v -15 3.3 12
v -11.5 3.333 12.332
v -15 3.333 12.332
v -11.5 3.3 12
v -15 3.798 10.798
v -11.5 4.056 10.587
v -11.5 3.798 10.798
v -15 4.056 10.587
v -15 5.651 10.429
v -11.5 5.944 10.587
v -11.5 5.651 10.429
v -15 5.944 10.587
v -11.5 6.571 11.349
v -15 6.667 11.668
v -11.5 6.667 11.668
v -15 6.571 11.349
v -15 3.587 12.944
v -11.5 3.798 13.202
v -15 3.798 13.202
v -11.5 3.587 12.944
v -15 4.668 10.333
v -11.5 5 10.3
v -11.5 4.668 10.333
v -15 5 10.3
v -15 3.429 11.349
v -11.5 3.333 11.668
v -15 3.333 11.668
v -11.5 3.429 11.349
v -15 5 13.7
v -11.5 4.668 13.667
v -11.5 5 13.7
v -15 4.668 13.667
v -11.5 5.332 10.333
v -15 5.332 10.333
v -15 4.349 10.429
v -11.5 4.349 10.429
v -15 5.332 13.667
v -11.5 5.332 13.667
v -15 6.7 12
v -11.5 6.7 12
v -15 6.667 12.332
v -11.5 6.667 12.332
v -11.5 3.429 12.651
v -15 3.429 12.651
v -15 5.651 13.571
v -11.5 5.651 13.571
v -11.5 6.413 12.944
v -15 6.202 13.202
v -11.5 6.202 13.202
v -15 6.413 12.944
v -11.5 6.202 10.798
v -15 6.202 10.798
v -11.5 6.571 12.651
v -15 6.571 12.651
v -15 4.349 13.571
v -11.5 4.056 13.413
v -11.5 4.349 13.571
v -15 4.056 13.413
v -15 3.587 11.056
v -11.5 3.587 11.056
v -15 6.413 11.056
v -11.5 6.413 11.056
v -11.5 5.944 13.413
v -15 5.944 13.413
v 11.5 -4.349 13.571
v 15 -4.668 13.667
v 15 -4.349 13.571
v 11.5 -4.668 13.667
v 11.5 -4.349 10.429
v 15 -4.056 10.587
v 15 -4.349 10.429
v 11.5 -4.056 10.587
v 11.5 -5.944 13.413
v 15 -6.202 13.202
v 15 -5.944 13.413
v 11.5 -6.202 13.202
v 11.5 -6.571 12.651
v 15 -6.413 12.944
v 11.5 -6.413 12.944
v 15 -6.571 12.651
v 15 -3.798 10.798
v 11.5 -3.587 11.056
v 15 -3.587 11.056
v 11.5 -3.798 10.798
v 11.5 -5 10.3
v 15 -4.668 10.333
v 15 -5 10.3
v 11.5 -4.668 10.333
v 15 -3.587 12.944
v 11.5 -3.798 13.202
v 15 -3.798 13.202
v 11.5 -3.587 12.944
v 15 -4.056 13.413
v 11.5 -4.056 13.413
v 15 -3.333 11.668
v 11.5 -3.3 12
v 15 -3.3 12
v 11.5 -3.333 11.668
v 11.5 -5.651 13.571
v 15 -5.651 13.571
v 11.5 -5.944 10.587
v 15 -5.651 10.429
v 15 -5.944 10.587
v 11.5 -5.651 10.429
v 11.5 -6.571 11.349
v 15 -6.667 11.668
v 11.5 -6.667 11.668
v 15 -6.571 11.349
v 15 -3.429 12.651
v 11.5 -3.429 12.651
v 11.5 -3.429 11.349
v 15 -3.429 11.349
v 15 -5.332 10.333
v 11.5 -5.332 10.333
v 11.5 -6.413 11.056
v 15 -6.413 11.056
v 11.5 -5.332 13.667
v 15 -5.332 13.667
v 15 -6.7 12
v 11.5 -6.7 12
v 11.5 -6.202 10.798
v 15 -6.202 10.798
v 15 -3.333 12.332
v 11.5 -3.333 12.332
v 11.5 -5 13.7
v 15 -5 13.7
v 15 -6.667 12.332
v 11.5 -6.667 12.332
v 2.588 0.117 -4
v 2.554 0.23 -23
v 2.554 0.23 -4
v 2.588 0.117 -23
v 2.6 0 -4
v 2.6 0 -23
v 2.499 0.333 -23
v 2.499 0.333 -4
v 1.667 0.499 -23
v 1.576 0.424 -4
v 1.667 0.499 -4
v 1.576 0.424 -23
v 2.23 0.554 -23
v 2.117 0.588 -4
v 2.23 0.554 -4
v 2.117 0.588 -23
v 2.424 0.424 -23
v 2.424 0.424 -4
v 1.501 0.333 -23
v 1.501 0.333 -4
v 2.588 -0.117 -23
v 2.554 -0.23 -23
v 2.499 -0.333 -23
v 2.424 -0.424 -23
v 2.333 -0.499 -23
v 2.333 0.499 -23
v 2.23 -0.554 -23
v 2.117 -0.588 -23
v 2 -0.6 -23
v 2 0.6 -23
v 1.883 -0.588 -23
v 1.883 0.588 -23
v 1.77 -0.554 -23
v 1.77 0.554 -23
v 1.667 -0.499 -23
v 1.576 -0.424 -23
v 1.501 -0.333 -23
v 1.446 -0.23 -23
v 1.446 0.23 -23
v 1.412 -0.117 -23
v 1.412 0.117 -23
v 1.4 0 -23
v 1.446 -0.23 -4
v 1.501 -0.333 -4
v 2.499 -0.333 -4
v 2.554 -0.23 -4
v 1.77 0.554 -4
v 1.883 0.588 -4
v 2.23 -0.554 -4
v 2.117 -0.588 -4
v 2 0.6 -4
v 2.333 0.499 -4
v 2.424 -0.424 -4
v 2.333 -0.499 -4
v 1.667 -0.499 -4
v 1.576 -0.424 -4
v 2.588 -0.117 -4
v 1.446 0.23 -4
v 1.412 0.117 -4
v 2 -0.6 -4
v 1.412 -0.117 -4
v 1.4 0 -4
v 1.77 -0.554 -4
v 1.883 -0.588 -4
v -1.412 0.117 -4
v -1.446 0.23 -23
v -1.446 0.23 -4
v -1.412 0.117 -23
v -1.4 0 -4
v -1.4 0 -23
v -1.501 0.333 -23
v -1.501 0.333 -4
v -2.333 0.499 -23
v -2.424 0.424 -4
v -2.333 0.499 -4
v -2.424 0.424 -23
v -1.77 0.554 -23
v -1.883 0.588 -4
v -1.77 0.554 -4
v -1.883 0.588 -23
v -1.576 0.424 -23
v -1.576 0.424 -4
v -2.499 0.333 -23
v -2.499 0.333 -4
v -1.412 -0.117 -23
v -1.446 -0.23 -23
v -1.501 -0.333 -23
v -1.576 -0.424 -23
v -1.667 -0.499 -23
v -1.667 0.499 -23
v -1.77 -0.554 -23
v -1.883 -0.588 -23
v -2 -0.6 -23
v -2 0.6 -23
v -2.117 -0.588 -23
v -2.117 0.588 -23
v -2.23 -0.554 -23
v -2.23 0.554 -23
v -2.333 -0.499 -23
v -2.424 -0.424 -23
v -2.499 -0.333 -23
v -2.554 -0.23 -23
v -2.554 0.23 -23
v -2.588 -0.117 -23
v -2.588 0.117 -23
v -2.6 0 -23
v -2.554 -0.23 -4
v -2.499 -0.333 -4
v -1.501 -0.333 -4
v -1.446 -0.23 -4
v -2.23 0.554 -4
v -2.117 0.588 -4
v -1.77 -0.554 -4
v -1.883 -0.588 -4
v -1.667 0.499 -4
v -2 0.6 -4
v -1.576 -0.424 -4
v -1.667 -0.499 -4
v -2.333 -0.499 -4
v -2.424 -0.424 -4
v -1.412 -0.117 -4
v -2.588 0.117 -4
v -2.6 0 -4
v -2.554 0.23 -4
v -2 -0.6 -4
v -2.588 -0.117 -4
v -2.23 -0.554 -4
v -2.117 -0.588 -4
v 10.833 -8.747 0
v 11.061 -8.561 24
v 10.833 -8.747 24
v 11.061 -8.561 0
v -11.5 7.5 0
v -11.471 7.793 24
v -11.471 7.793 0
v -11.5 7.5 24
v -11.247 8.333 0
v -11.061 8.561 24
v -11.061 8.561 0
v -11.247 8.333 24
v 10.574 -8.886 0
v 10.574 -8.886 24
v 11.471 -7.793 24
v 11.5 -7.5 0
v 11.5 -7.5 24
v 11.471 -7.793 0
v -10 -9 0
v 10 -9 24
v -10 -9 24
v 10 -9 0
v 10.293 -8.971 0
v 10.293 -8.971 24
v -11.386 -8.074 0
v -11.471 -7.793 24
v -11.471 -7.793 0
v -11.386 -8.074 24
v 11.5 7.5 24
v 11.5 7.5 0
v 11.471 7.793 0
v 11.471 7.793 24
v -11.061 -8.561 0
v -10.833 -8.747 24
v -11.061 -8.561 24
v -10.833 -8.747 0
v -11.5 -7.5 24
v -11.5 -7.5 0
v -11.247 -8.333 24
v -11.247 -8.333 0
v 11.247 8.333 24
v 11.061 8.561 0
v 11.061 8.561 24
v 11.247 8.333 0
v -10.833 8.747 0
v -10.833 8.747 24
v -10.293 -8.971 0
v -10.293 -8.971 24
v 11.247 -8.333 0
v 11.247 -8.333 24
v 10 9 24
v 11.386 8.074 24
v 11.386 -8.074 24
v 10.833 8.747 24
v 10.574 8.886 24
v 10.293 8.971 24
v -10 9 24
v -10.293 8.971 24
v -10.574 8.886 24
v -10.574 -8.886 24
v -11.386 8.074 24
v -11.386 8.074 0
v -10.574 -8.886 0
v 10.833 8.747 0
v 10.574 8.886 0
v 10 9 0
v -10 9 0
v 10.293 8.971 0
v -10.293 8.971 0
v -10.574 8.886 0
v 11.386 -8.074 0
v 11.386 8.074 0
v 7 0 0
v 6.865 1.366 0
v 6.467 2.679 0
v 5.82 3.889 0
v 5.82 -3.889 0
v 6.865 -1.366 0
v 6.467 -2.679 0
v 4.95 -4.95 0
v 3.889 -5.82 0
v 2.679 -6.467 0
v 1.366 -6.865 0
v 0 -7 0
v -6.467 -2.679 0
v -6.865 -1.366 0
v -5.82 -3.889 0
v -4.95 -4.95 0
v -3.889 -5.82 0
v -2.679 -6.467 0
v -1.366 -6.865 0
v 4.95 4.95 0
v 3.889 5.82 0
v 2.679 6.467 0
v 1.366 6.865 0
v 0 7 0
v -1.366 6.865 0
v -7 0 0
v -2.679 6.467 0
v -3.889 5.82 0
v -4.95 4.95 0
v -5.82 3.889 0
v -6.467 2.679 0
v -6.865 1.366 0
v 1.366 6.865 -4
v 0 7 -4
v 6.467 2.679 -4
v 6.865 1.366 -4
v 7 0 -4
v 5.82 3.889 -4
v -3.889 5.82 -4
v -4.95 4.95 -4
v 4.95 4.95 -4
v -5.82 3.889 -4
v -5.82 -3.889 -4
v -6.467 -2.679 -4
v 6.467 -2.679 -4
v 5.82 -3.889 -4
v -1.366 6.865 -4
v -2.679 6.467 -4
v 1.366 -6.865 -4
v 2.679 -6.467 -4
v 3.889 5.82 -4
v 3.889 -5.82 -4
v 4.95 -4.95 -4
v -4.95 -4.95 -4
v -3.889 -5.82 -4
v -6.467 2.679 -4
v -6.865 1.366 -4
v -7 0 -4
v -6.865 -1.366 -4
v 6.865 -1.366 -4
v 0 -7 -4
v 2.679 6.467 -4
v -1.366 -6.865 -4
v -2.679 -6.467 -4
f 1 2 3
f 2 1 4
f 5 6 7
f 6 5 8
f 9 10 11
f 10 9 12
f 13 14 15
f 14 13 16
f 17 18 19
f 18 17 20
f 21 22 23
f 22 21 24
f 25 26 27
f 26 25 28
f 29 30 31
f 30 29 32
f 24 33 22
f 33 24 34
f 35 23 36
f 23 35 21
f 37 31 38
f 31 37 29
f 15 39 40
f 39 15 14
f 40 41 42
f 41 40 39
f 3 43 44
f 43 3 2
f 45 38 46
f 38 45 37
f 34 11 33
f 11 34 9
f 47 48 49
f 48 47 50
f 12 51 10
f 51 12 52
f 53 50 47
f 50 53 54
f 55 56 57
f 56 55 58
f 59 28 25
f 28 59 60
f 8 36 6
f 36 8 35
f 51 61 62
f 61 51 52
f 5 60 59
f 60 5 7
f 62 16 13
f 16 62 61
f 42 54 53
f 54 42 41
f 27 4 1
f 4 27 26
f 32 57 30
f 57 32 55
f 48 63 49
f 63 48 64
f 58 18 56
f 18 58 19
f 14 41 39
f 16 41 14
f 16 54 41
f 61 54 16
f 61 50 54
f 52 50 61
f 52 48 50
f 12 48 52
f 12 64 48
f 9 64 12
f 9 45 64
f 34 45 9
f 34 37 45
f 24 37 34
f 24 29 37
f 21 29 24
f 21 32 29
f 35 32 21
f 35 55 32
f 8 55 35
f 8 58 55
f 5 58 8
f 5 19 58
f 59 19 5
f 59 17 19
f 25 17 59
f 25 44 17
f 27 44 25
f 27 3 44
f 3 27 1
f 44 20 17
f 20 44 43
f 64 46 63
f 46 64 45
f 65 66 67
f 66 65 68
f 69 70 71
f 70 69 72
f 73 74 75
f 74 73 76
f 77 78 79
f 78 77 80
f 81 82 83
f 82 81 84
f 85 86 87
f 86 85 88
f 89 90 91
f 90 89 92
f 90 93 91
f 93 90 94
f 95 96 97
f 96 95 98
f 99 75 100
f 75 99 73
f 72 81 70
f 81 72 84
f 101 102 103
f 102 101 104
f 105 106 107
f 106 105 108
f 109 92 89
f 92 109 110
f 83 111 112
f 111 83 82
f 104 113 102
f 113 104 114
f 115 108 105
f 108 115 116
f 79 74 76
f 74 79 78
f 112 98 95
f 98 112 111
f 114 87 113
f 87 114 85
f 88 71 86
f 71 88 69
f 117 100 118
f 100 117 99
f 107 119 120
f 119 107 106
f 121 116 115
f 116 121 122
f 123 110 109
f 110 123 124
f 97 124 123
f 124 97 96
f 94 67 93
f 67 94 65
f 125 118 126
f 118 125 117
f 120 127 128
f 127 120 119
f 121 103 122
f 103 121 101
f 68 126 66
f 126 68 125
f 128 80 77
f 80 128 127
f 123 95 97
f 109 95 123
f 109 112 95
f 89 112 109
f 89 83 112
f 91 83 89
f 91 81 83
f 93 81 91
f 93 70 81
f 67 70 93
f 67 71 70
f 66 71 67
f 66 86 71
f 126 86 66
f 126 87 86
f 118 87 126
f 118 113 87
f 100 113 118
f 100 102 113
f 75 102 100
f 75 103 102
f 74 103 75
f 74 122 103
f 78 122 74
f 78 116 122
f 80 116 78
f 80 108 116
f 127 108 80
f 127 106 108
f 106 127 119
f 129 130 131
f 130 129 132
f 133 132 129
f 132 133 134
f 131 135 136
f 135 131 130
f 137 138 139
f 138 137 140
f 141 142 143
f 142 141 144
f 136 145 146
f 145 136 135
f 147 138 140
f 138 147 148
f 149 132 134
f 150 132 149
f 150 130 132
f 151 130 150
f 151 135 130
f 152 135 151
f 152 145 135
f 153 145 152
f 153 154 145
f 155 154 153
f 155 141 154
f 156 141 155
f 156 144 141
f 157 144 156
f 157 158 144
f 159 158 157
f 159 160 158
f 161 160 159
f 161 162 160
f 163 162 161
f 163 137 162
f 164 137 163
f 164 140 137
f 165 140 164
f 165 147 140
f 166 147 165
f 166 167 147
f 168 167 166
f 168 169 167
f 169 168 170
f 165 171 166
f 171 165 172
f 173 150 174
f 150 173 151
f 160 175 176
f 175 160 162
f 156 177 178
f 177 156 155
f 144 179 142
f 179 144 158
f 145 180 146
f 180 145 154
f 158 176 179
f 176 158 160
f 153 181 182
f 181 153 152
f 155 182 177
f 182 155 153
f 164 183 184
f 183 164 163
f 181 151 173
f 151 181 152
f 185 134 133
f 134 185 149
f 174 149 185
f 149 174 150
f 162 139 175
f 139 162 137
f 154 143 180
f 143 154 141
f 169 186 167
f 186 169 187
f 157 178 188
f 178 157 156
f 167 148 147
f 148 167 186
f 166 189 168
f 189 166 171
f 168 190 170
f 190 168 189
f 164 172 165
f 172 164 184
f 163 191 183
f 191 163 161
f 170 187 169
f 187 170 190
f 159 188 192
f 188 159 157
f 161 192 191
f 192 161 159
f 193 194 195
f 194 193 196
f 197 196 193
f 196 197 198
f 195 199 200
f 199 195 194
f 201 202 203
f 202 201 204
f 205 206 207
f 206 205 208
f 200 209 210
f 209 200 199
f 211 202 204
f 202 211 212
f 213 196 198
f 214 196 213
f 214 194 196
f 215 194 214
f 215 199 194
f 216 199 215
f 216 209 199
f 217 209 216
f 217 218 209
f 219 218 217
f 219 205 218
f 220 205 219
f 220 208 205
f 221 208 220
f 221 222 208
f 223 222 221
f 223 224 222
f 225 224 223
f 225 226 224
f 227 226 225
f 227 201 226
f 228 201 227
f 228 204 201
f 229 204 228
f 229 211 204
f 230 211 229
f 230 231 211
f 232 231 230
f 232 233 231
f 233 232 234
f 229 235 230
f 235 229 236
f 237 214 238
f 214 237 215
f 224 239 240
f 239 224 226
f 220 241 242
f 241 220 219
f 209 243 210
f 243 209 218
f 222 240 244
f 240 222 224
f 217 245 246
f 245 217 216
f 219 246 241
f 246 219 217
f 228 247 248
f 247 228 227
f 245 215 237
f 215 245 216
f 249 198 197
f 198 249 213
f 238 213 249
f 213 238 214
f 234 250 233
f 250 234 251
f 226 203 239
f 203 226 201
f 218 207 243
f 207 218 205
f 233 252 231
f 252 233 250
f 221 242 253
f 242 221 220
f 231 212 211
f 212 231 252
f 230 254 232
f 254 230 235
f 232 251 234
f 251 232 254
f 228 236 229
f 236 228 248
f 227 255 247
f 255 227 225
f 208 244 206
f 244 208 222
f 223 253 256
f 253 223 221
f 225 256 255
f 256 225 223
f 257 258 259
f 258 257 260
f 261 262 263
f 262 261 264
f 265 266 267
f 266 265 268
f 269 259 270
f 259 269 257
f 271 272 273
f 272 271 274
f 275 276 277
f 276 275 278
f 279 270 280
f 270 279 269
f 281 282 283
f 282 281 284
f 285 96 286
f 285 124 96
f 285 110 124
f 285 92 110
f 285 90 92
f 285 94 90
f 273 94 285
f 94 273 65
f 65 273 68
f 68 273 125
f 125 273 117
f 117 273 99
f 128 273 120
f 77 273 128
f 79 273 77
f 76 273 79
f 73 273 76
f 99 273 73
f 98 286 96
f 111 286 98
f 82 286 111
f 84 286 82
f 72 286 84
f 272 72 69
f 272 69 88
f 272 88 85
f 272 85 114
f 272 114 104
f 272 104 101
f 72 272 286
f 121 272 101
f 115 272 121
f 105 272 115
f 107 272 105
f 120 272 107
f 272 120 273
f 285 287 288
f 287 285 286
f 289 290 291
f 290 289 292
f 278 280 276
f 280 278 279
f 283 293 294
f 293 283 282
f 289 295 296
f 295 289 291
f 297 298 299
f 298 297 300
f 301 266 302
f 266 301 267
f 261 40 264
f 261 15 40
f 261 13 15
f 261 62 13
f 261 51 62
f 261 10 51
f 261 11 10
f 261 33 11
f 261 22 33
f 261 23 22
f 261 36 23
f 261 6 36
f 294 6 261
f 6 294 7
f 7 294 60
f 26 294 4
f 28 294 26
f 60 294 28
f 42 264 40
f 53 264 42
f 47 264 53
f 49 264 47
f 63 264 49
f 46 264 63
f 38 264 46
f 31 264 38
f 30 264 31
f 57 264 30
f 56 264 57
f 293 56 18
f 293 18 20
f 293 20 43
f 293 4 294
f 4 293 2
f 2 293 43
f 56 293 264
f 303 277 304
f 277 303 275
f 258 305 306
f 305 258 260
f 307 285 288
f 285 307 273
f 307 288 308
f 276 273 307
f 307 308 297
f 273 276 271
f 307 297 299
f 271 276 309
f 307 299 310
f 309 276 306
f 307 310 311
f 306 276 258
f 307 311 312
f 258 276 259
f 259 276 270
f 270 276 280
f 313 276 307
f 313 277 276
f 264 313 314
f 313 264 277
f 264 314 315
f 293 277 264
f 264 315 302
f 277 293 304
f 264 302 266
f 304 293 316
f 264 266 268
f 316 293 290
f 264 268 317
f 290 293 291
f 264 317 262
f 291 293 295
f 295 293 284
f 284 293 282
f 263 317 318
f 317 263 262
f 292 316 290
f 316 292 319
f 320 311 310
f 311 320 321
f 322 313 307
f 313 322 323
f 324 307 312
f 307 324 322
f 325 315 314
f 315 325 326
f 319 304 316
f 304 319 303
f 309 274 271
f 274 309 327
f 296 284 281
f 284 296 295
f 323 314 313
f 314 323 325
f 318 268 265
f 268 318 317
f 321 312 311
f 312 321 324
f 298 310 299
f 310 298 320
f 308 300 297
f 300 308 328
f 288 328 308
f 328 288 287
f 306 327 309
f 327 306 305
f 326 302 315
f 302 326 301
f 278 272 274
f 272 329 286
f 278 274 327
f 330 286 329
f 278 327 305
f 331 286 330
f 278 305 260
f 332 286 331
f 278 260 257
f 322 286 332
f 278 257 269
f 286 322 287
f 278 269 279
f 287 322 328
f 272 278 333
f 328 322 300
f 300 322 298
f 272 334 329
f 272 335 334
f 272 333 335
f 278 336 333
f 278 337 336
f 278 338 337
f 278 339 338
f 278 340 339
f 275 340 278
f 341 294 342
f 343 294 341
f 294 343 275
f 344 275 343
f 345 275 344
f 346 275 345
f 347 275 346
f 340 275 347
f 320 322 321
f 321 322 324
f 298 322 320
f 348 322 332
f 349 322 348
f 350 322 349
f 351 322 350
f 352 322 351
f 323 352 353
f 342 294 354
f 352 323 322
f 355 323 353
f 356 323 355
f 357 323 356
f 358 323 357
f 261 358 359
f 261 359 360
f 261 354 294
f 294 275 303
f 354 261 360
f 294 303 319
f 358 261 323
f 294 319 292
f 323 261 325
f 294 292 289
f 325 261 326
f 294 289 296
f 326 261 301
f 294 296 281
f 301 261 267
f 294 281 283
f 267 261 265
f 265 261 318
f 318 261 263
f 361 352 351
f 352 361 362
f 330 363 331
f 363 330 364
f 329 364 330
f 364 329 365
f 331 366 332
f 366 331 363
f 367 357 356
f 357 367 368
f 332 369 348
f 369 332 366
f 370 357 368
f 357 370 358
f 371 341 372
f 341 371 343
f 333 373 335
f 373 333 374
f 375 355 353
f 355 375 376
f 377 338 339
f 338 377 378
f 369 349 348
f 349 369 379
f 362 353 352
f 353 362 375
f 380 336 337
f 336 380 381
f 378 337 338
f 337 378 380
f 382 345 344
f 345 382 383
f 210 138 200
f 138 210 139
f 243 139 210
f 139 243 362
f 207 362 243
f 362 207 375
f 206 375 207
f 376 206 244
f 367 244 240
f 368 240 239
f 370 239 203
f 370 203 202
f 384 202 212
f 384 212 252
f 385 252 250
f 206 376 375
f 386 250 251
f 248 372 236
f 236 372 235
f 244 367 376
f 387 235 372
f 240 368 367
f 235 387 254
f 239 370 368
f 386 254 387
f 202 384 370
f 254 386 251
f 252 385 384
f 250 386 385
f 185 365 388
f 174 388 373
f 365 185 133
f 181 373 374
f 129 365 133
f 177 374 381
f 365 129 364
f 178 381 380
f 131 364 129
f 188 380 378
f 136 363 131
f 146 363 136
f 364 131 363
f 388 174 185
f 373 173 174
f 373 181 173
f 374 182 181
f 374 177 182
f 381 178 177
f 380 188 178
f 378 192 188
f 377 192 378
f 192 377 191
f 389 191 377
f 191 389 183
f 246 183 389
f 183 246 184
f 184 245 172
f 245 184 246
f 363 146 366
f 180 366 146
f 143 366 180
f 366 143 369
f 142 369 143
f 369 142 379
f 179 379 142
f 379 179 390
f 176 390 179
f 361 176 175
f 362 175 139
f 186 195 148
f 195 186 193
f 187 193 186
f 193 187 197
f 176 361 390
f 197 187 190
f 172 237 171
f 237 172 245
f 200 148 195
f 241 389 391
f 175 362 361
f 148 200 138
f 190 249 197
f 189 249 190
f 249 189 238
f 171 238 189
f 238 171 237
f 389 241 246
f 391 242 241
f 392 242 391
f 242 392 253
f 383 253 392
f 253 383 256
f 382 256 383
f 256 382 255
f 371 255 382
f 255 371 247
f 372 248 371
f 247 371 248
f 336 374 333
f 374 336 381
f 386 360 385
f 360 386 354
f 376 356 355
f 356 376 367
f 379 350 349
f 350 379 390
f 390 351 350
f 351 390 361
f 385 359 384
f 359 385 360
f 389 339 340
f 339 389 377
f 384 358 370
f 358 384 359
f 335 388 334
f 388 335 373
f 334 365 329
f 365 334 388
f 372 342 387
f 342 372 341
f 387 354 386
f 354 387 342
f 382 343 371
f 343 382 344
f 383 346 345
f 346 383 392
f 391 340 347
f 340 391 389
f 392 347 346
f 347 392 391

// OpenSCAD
// JYPDM-10 M20 Micro Diaphragm Pump — parametric placeholder model
// ===============================================================
// Source: Jiayin manufacturer spec page + AliExpress listings
//   - Type: Micro diaphragm pump (BOM says "peristaltic" — VERIFY)
//   - Body: ~20mm form factor (M20 class) — EXACT DIMENSIONS NEEDED
//   - Voltage: 5-6V DC
//   - Flow: 30-100 g/min (water)
//   - Inlet/outlet: 3.4mm OD barb
//   - Weight: ~6-7g
//   - Used for: mop water delivery
//   - Alternative: volumetric peristaltic pump (310-type, ~Φ27×60mm)
// ===============================================================
// Status: PLACEHOLDER — all body dimensions are ESTIMATED from
// product class. Model will be refined after maintainer measures.

/* [Dimensions — ALL ESTIMATED, measure real part] */
pump_w         = 20.0;    // body width (mm, estimated: M20 class)
pump_d         = 15.0;    // body depth (mm, estimated)
pump_h         = 24.0;    // body height (mm, estimated)
port_od        = 3.4;     // hose barb outer diameter (mm, from listing)
port_id        = 2.0;     // hose barb inner diameter (mm)
port_l         = 5.0;     // barb length (mm)
port_center_y  = 5.0;     // port center offset from body edge (mm)
motor_h        = 8.0;     // motor can height below body (mm)
motor_d        = 14.0;    // motor can diameter (mm)

wire_l         = 30.0;    // wire length from body (mm)

$fn = 32;

module jy_pdm10_body() {
    color("Black") {
        // Main body — rectangular prism, rounded corners
        linear_extrude(height=pump_h)
            offset(r=1.5)
                square([pump_w, pump_d], center=true);
    }
}

module jy_pdm10_ports() {
    color("DarkGray") {
        // Inlet port (left side)
        translate([-pump_w/2 - port_l/2, port_center_y, pump_h/2])
            rotate([0, 90, 0])
                cylinder(d=port_od, h=port_l, center=true);
        // Outlet port (right side or top — verify)
        translate([pump_w/2 + port_l/2, -port_center_y, pump_h/2])
            rotate([0, 90, 0])
                cylinder(d=port_od, h=port_l, center=true);
    }
}

module jy_pdm10_motor_can() {
    color("Silver") {
        // Motor can underneath
        translate([0, 0, -motor_h/2])
            cylinder(d=motor_d, h=motor_h);
    }
}

module jy_pdm10_wires() {
    color("Red") {
        translate([2, 0, -motor_h - wire_l/2])
            cylinder(d=1.2, h=wire_l);
    }
    color("Black") {
        translate([-2, 0, -motor_h - wire_l/2])
            cylinder(d=1.2, h=wire_l);
    }
}

module jy_pdm10_pump() {
    union() {
        jy_pdm10_body();
        jy_pdm10_ports();
        jy_pdm10_motor_can();
        jy_pdm10_wires();
    }
}

jy_pdm10_pump();

echo("JYPDM-10 (M20) pump — ALL DIMENSIONS ESTIMATED");
echo("Body:", pump_w, "x", pump_d, "x", pump_h, "mm (MEASURE)");
echo("Ports OD:", port_od, "mm");
